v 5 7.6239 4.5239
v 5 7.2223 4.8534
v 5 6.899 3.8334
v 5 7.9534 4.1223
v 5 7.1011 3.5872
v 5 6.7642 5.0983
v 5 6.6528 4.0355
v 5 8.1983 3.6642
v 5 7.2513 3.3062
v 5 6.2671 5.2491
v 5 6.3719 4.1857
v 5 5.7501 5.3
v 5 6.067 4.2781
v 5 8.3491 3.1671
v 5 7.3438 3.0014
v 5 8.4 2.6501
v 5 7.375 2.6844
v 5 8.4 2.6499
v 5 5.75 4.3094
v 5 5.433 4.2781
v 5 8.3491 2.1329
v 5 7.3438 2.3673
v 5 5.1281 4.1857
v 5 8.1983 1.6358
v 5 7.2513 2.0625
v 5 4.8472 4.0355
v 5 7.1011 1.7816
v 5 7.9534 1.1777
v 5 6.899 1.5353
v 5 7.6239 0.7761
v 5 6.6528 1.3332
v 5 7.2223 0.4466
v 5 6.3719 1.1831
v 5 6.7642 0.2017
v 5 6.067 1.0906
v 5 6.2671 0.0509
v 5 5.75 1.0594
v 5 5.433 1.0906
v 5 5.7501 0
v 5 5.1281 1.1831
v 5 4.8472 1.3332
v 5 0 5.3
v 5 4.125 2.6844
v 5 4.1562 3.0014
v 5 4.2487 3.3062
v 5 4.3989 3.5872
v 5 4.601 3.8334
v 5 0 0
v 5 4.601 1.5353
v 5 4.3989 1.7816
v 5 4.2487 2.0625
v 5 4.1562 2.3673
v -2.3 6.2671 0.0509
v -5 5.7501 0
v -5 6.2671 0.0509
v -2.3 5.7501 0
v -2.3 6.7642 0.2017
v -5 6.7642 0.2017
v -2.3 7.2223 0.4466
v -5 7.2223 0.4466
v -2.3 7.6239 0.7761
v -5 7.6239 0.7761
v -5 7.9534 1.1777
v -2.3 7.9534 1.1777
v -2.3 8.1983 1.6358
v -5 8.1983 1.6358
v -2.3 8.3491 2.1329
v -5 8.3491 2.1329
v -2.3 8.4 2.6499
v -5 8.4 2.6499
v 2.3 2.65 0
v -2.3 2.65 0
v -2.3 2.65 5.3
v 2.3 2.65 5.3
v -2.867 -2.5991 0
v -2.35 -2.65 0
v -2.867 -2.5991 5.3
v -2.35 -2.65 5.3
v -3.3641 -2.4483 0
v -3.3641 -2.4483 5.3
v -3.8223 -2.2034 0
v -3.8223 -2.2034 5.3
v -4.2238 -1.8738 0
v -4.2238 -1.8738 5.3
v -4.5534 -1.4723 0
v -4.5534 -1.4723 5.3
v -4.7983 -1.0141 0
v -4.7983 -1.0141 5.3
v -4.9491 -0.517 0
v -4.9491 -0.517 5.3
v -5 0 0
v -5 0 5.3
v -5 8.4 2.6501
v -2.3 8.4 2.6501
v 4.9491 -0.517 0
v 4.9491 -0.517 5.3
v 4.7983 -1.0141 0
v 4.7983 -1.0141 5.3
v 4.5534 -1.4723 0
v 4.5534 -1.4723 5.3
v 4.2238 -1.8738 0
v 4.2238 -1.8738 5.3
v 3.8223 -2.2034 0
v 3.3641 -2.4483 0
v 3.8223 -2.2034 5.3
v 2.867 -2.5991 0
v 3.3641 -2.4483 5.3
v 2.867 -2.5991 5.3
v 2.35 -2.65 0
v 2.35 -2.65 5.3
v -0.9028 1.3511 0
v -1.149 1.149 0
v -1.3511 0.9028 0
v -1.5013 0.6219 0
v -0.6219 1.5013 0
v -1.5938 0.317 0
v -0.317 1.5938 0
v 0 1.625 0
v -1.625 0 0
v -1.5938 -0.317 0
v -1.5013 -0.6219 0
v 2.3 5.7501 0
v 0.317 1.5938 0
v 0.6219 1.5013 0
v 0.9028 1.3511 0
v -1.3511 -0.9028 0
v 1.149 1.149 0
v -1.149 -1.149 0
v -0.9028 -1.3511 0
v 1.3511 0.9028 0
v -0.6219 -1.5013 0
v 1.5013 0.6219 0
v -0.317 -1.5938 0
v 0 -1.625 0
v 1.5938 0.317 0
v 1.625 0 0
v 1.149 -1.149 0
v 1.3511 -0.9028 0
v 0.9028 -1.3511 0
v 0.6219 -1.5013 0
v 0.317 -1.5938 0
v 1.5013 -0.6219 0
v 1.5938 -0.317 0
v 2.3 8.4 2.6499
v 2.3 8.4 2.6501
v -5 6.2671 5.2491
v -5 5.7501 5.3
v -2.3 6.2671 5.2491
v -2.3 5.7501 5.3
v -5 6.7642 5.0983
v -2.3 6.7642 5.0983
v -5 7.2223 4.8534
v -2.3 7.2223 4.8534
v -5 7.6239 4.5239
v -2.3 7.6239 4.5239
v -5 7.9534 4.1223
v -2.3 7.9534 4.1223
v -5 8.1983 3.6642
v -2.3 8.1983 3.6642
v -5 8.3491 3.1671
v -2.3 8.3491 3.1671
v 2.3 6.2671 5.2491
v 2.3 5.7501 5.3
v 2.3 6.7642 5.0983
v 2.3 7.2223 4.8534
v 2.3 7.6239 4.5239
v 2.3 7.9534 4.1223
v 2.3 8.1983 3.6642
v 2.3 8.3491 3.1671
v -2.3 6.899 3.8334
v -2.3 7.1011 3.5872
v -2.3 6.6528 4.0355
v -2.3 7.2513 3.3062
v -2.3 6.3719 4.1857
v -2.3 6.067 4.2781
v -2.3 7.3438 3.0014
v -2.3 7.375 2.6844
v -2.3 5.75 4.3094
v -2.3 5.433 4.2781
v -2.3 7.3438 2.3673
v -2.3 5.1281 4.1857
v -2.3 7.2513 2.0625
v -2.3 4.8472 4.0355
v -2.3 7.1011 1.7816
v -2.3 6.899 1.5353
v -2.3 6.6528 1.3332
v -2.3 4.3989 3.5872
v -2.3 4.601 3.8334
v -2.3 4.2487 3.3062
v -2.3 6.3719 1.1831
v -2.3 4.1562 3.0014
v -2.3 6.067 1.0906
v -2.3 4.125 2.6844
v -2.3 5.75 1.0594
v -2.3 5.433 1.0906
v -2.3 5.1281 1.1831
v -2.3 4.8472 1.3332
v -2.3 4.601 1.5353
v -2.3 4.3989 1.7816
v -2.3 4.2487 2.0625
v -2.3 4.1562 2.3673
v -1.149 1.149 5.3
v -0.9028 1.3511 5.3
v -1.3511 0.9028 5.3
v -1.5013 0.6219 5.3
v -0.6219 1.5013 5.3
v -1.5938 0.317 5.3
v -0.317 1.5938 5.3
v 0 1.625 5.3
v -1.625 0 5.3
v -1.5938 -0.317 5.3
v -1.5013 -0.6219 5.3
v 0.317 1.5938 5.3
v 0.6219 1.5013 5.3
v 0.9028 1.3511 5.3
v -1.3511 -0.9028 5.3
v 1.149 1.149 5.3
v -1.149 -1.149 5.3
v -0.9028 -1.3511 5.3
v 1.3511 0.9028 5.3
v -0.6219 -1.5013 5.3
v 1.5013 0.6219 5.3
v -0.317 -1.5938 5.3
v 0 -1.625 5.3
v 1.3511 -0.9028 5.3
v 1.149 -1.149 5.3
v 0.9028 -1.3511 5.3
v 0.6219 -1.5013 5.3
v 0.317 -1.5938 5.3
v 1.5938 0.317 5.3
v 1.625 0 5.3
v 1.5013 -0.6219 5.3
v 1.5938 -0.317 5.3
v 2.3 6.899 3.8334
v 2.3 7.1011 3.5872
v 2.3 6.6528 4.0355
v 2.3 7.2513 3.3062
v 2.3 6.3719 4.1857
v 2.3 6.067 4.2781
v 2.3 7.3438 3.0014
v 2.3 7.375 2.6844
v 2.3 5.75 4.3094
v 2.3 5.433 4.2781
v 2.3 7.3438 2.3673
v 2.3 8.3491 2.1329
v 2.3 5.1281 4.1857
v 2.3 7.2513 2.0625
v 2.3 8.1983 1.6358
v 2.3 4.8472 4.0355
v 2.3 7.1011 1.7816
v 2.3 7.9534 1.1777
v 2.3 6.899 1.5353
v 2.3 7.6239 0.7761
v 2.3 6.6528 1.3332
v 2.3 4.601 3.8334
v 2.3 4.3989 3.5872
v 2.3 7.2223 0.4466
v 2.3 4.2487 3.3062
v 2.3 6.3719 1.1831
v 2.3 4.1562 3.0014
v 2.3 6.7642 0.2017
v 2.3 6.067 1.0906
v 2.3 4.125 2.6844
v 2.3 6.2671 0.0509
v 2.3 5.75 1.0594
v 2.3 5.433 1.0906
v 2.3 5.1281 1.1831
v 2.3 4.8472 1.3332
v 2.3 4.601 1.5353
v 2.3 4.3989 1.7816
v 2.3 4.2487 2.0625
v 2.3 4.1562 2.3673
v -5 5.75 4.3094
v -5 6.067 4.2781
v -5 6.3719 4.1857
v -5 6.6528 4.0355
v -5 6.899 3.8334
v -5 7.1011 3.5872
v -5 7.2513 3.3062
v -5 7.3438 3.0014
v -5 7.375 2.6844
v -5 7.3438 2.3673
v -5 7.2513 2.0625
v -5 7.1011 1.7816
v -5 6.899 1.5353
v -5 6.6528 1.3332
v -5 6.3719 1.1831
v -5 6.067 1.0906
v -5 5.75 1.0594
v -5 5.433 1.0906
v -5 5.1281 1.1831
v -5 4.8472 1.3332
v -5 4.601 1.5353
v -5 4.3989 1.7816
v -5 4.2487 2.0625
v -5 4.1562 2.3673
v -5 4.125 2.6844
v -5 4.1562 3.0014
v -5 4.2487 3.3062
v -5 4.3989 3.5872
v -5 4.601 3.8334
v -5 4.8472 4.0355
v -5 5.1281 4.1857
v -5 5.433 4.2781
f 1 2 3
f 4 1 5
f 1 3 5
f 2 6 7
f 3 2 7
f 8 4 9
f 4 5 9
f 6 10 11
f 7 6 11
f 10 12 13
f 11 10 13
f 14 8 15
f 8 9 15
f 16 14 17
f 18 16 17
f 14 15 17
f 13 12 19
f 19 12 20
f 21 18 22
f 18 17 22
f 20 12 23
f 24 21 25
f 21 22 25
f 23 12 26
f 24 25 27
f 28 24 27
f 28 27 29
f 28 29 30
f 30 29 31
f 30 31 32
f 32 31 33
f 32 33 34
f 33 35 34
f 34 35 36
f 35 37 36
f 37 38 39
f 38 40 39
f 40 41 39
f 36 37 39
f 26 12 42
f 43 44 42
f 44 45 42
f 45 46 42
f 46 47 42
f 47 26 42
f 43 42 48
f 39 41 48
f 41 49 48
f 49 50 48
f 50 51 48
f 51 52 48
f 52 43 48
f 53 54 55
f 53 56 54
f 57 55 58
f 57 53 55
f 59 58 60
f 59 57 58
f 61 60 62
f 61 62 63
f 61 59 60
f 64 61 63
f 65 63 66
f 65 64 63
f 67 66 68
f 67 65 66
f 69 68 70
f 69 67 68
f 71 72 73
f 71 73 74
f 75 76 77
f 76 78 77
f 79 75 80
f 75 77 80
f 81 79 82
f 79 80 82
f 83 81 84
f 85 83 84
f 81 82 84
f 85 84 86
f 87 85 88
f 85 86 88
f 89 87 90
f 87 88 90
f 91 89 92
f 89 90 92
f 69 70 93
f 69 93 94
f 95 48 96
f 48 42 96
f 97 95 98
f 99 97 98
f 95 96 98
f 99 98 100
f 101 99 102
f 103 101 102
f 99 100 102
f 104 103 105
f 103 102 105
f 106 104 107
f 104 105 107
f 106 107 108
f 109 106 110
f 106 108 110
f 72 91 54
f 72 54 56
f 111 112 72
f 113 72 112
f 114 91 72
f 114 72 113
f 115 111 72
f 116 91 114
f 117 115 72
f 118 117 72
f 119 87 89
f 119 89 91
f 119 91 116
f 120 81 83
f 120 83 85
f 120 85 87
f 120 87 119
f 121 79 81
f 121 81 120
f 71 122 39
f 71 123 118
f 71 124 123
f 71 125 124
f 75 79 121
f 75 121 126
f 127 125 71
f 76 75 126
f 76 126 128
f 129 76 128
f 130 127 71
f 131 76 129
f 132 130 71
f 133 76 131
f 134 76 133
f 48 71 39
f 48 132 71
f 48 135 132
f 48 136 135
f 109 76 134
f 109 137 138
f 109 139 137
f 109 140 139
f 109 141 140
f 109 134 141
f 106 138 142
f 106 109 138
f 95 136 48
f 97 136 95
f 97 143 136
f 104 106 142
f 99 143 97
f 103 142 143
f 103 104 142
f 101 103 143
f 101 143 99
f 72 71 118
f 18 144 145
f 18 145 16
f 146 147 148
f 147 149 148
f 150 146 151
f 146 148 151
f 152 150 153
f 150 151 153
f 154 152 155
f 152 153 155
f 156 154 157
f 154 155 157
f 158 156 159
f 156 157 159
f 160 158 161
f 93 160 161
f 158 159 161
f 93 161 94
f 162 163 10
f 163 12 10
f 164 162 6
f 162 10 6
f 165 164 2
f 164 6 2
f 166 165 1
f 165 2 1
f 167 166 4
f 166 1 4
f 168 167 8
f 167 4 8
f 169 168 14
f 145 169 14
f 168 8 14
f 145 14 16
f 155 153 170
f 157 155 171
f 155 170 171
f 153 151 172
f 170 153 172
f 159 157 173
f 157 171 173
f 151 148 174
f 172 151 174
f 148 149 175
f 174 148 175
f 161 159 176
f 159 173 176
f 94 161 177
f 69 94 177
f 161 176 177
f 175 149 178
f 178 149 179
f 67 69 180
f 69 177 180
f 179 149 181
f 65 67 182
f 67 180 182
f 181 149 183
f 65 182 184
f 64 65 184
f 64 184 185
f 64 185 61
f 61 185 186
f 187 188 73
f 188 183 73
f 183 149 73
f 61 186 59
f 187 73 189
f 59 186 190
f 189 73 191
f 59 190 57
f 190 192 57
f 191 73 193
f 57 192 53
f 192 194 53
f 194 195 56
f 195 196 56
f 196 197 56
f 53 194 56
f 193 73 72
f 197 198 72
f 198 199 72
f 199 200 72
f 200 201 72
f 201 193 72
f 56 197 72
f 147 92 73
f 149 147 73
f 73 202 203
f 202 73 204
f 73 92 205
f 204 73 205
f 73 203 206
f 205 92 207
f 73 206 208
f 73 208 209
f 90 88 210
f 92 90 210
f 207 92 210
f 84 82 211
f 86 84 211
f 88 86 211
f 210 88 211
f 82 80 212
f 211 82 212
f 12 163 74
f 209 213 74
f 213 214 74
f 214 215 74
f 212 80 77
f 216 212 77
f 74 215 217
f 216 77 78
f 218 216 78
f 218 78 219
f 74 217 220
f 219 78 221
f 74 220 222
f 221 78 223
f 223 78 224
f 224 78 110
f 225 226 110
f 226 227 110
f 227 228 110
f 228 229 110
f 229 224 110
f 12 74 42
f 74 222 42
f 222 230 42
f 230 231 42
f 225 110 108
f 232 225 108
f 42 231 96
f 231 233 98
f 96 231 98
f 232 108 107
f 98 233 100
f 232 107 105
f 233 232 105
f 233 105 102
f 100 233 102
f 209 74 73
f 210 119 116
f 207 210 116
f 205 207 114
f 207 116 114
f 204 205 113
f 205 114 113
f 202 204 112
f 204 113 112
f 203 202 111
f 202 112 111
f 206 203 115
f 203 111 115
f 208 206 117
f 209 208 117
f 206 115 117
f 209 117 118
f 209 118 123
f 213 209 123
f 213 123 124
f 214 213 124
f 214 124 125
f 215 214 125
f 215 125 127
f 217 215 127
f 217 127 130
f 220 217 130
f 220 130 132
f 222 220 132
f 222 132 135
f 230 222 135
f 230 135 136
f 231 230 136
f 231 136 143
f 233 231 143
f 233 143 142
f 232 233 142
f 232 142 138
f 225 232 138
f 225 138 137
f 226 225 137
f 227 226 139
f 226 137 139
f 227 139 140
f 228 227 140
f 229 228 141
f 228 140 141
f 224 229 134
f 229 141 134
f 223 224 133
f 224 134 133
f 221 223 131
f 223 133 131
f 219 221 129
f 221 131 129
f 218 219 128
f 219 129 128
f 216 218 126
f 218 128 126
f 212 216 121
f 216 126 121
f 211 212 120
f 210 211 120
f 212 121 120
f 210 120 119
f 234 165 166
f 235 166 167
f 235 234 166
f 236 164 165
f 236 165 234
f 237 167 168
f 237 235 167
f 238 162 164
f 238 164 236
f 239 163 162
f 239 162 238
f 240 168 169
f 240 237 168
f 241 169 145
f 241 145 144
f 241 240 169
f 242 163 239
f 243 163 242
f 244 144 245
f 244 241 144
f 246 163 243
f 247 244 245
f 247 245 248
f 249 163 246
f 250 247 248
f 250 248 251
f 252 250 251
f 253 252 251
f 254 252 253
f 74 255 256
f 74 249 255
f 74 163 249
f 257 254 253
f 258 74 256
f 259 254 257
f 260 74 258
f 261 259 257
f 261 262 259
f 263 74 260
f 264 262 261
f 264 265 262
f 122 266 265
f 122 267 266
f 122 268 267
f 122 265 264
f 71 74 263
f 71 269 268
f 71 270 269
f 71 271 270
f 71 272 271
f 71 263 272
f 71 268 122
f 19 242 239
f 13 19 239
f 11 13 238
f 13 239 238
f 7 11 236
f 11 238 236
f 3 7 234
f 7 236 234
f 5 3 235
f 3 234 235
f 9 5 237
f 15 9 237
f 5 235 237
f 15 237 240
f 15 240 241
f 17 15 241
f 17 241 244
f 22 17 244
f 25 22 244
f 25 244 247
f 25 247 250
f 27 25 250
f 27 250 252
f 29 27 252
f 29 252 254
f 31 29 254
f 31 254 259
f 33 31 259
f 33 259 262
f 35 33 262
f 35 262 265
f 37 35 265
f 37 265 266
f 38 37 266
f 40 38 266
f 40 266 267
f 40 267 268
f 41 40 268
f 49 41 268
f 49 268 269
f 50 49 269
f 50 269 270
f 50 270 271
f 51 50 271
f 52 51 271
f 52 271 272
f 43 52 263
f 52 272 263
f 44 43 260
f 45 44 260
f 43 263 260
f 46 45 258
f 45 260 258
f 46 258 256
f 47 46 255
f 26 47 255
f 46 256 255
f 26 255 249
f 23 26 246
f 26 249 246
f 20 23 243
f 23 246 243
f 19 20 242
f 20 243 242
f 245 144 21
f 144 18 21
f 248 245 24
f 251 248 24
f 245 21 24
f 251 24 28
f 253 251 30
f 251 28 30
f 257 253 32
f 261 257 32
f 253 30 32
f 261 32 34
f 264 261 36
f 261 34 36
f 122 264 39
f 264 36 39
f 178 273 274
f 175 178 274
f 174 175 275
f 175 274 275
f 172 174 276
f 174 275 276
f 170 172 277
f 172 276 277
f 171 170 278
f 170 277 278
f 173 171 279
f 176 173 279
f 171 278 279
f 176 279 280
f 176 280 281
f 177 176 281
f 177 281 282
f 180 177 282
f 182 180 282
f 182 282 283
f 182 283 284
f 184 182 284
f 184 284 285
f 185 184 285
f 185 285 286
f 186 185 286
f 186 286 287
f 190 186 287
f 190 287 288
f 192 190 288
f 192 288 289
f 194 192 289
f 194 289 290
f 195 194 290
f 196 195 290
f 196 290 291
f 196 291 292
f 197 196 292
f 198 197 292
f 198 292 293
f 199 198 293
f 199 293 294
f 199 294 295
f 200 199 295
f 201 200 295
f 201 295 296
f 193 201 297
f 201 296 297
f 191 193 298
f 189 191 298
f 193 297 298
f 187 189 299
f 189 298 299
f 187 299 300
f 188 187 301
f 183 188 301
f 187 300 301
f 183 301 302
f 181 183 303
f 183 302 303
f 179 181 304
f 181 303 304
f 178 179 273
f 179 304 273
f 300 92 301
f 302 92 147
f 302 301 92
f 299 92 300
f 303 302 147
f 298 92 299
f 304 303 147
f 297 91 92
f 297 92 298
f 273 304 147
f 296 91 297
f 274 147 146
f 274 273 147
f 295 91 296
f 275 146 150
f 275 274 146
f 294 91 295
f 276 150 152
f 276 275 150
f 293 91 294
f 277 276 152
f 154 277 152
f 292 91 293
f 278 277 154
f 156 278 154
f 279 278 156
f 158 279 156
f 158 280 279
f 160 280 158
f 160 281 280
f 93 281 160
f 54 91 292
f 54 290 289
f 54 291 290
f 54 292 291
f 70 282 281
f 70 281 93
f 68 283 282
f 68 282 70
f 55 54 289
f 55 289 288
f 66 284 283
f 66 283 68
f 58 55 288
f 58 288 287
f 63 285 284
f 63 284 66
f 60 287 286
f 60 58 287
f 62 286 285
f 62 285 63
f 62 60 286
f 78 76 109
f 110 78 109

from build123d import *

# Parameters (mm, degrees)
SCHIZZO1_W                   = 10
SCHIZZO1_H                   = 5.3
ESTRUSIONE_ESTRUSIONE1_DEPTH = 5.3
SCHIZZO2_R                   = 1.625
TAGLIO_ESTRUSIONE3_DEPTH     = 8.753225135
SCHIZZO3_W                   = 2.7
SCHIZZO3_H                   = 5.3
ESTRUSIONE_ESTRUSIONE2_DEPTH = 5.75
SCHIZZO4_R                   = 1.625
TAGLIO_ESTRUSIONE4_DEPTH     = 15.094325099
RACCORDO2_R                  = 2.65
RACCORDO3_R                  = 2.65


with BuildPart() as part:
    # Schizzo1 → Estrusione-Estrusione1 (new body)
    with BuildSketch(Plane.XY):
        Rectangle(SCHIZZO1_W, SCHIZZO1_H)
    extrude(amount=ESTRUSIONE_ESTRUSIONE1_DEPTH)

    # Schizzo2 → Taglio-Estrusione3 (cut, through all)
    with BuildSketch(Plane(origin=(0, 0, 0), x_dir=(-1, 0, 0), z_dir=(0, 0, -1))):
        Circle(SCHIZZO2_R)
    extrude(amount=-TAGLIO_ESTRUSIONE3_DEPTH, mode=Mode.SUBTRACT)

    # Schizzo3 → Estrusione-Estrusione2 (add)
    with BuildSketch(Plane(origin=(0, 2.65, 0), x_dir=(1, 0, 0), z_dir=(0, 1, 0))):
        with Locations((3.65, -2.65)):
            Rectangle(SCHIZZO3_W, SCHIZZO3_H)
        with Locations((-3.65, -2.65)):
            Rectangle(SCHIZZO3_W, SCHIZZO3_H)
    extrude(amount=ESTRUSIONE_ESTRUSIONE2_DEPTH)

    # Schizzo4 → Taglio-Estrusione4 (cut, through all)
    with BuildSketch(Plane.ZY.offset(5)):
        with Locations((2.684358211, 5.75)):
            Circle(SCHIZZO4_R)
    extrude(amount=-TAGLIO_ESTRUSIONE4_DEPTH, mode=Mode.SUBTRACT)

    # Raccordo2
    raccordo2_edges = [part.edges().sort_by_distance(p)[0] for p in [
        (3.65, 8.4, 0),
        (3.65, 8.4, 5.3),
        (-3.65, 8.4, 5.3),
        (-3.65, 8.4, 0),
    ]]
    fillet(raccordo2_edges, radius=RACCORDO2_R - 0.0001)  # a hair under: the kernel refuses the full size

    # Raccordo3
    raccordo3_edges = [part.edges().sort_by_distance(p)[0] for p in [
        (-5, -2.65, 2.65),
        (5, -2.65, 2.65),
    ]]
    fillet(raccordo3_edges, radius=RACCORDO3_R)


solid = part.part
